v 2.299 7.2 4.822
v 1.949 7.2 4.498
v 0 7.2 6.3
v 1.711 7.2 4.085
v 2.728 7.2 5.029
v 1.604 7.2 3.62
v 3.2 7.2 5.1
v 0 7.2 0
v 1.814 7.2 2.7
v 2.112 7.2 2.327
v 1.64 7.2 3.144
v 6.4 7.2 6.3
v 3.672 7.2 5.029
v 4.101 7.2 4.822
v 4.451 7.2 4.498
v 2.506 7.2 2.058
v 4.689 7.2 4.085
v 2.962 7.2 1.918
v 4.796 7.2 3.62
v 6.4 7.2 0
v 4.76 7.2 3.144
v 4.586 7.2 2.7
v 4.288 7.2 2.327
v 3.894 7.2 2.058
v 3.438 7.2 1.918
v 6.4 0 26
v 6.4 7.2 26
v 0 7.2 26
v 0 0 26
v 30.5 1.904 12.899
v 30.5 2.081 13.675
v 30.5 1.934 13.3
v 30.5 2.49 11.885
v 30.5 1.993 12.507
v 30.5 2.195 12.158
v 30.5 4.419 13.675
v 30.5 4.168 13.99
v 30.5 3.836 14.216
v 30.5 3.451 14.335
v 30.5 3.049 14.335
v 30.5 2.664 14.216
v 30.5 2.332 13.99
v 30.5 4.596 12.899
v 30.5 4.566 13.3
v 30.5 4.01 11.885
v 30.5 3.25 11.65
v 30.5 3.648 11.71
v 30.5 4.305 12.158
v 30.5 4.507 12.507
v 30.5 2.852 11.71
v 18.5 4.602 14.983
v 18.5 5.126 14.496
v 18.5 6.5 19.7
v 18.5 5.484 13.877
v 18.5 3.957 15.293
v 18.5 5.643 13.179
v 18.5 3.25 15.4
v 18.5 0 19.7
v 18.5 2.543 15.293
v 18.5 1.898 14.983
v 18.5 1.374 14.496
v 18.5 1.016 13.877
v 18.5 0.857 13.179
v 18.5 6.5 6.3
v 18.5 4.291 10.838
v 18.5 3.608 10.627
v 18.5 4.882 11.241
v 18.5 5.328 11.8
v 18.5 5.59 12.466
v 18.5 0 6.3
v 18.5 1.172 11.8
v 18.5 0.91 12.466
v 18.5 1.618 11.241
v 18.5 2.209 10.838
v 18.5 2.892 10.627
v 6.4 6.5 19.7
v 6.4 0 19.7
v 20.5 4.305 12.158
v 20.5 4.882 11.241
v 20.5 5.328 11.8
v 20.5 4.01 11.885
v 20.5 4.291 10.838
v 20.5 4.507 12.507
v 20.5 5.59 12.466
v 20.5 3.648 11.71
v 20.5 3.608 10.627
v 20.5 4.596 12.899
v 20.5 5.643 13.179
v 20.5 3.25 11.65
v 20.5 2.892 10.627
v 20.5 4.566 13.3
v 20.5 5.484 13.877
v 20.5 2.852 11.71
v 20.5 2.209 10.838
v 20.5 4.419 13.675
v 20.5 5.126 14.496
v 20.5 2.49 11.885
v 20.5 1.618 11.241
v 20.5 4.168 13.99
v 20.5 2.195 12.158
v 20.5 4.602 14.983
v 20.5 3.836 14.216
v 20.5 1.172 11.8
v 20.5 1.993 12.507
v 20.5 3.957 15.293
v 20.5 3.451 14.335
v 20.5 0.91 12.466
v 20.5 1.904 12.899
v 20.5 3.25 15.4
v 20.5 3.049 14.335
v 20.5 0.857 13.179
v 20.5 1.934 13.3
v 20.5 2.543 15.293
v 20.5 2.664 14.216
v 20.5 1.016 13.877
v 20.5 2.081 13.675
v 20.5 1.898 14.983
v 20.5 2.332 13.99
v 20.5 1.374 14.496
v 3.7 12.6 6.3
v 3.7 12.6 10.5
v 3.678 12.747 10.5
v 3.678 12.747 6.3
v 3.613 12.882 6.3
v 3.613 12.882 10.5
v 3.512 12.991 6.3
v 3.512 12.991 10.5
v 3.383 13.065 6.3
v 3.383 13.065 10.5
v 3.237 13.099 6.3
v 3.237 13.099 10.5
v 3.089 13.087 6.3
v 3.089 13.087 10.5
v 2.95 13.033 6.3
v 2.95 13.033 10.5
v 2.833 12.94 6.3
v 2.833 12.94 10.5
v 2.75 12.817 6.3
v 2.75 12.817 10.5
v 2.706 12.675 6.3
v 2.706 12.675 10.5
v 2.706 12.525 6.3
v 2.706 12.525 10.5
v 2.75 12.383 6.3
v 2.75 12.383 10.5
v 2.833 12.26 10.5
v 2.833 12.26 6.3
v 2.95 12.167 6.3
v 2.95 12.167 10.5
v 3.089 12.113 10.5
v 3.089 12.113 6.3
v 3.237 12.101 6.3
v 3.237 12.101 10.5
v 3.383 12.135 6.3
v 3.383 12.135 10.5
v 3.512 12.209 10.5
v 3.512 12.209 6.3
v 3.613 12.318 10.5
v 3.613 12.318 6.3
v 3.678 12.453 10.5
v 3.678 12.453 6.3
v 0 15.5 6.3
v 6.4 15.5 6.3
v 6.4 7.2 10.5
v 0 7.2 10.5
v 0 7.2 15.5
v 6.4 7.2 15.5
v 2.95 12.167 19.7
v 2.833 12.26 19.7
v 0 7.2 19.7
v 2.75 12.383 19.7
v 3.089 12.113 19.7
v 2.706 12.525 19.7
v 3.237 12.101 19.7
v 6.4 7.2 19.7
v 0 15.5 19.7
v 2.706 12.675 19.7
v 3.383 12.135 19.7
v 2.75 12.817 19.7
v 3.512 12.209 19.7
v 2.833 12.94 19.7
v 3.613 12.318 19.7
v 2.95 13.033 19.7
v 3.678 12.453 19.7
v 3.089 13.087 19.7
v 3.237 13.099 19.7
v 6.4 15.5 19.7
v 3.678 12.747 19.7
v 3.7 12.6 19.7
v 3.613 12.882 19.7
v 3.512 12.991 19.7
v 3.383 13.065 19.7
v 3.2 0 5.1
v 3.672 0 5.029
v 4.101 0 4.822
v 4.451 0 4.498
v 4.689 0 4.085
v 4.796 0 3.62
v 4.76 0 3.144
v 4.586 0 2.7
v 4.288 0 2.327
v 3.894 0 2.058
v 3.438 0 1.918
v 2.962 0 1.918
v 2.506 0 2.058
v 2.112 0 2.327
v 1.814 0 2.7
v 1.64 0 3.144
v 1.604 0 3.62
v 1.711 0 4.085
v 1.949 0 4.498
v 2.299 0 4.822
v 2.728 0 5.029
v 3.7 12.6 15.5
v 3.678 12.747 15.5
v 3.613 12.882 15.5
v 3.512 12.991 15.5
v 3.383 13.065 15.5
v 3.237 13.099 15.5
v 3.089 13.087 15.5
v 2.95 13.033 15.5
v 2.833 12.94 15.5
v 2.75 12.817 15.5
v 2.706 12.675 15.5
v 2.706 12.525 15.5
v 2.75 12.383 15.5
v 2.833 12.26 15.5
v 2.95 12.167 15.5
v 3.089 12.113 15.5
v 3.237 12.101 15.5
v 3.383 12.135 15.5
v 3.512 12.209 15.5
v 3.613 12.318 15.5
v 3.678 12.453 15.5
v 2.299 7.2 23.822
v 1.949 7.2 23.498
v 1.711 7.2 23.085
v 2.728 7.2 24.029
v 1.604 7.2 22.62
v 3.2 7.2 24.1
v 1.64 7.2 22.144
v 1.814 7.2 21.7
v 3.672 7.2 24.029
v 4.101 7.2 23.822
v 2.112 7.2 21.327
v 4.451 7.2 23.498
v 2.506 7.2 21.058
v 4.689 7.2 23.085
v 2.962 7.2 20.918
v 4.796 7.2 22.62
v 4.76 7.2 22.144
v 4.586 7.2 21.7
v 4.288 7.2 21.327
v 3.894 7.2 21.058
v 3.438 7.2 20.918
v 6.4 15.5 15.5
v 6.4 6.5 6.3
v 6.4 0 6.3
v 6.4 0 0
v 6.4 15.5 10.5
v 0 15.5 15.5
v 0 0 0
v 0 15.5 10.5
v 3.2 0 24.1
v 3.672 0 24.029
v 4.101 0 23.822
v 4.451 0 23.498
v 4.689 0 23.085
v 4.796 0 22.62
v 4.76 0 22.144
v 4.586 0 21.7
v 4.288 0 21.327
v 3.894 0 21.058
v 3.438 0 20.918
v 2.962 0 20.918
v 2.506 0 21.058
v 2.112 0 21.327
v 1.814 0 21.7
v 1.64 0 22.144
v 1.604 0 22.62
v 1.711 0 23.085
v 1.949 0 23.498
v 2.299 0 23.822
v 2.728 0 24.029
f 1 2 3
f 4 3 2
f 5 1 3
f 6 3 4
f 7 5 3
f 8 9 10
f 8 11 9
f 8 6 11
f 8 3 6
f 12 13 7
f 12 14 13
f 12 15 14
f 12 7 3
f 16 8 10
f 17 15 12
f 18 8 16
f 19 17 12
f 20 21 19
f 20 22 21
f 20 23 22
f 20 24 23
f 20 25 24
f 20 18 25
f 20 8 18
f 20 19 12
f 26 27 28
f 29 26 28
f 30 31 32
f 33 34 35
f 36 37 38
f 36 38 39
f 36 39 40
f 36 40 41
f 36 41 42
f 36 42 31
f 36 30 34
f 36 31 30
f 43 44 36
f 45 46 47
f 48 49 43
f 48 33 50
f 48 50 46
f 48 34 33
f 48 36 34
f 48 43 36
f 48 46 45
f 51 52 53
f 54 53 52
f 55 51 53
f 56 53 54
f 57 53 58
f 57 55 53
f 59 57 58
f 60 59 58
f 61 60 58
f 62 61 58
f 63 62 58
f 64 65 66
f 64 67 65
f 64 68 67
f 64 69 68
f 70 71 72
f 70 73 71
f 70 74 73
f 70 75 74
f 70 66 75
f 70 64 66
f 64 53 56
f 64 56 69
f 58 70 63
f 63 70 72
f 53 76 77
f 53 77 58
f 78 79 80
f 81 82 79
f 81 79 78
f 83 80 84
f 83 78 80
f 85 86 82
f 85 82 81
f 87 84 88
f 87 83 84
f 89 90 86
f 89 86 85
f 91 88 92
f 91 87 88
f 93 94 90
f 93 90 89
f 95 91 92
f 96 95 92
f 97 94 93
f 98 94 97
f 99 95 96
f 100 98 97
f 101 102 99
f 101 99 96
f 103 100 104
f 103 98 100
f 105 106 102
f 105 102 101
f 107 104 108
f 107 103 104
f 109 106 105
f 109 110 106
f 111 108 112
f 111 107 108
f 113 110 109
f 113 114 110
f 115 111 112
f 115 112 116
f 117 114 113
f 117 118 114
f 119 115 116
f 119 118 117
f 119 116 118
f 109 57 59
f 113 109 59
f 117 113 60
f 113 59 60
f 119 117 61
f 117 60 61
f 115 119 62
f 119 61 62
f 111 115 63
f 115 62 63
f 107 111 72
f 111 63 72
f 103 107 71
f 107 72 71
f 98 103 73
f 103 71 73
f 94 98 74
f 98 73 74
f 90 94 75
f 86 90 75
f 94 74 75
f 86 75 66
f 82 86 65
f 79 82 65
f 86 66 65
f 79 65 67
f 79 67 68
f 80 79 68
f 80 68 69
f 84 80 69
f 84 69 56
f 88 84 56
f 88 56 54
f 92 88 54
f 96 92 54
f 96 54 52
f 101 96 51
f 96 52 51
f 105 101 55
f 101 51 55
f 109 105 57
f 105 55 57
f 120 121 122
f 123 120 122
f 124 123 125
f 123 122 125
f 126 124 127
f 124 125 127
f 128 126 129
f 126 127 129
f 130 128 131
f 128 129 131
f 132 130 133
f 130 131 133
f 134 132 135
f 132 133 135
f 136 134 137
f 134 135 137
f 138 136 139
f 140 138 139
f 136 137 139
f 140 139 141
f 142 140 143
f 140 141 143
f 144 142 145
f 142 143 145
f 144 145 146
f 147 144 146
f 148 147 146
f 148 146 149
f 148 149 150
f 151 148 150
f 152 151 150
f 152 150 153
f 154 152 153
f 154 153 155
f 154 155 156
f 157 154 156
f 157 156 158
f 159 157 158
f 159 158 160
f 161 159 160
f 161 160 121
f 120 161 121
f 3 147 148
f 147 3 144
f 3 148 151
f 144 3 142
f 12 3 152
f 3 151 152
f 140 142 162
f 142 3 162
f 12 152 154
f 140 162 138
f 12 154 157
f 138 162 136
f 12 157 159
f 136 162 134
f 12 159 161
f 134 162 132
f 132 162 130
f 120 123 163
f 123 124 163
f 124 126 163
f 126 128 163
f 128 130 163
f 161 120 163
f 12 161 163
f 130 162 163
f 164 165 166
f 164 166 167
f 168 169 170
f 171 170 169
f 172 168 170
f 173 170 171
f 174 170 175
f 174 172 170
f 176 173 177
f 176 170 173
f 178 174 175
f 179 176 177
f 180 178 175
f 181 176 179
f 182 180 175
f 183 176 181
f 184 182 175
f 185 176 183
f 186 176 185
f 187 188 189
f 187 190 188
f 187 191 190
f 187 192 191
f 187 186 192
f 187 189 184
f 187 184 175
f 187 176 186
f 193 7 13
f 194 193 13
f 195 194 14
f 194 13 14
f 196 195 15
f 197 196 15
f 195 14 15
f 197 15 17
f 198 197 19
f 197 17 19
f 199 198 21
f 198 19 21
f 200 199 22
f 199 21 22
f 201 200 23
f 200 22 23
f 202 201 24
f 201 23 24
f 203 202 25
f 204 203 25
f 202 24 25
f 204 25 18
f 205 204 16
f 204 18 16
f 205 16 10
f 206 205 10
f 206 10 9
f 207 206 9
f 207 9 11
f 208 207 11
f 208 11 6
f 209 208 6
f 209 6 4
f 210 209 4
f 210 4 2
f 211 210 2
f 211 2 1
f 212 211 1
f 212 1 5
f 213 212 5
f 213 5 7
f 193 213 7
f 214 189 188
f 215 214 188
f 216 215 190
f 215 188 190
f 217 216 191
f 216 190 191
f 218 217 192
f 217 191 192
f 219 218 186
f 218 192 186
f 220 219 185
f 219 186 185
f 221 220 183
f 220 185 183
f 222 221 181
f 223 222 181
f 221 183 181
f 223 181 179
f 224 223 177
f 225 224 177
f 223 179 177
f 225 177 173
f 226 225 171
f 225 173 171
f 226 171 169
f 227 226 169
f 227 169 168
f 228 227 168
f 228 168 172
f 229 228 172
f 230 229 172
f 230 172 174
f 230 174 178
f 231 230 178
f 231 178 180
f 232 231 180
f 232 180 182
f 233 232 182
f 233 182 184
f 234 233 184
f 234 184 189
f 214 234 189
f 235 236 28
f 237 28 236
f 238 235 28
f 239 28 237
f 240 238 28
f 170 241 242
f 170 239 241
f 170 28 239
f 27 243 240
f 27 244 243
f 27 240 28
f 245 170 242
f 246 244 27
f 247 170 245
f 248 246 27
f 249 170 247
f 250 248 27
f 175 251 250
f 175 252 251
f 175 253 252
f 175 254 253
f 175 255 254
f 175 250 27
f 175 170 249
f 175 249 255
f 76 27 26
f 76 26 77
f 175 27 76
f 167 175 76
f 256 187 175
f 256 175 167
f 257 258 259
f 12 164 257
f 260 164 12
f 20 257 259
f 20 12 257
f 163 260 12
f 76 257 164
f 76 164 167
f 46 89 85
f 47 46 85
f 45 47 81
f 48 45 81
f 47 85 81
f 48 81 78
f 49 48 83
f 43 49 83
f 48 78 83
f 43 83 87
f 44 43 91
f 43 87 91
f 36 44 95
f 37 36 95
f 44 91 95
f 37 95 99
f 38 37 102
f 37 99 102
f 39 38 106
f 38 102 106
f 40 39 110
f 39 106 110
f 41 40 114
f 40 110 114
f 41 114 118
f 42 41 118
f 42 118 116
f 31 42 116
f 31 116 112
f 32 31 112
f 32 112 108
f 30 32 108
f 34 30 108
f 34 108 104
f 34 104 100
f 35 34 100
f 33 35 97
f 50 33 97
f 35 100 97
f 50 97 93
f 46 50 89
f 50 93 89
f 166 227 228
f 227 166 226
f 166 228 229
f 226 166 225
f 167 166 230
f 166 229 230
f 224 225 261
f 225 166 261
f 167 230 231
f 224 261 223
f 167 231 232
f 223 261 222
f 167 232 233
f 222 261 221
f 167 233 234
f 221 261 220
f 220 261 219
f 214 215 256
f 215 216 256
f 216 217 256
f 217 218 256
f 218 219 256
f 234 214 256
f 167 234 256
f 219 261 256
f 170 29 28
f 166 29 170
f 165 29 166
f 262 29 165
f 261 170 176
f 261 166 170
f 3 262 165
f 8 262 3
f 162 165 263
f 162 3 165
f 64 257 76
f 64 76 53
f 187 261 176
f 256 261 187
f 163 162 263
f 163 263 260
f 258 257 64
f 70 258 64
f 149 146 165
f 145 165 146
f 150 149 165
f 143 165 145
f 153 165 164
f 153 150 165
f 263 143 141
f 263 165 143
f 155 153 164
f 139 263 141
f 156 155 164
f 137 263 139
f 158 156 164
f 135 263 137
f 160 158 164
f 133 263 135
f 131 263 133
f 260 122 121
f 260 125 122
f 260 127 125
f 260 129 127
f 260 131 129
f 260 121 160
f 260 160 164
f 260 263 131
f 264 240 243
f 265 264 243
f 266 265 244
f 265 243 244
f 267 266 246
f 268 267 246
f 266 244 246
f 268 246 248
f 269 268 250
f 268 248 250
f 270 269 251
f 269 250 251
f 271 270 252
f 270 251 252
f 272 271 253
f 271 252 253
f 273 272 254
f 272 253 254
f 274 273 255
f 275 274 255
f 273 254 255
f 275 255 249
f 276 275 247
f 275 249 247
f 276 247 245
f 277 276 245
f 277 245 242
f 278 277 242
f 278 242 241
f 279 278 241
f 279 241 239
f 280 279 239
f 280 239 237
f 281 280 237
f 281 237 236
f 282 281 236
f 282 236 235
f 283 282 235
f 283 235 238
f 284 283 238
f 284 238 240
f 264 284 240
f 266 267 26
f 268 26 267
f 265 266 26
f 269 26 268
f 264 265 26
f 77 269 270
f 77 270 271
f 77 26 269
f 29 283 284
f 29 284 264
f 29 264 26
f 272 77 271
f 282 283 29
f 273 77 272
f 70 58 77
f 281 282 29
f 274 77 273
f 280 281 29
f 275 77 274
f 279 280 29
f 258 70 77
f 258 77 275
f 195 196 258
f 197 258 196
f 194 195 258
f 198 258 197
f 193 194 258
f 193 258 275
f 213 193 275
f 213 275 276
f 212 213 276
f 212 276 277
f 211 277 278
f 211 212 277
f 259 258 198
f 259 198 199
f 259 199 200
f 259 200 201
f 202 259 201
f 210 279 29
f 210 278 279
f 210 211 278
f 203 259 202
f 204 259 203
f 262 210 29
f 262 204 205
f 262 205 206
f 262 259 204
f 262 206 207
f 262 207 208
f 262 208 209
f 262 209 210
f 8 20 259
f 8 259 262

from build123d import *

# Parameters (mm, degrees)
AUFSATZ_LINEAR_AUSTRAGEN1_DEPTH = 26
SKIZZE2_W                       = 12.1
SKIZZE2_H                       = 6.3
SCHNITT_LINEAR_AUSTRAGEN1_DEPTH = 26
SKIZZE3_W                       = 6.4
SKIZZE3_H                       = 6.3
SCHNITT_LINEAR_AUSTRAGEN2_DEPTH = 8.3
SKIZZE4_W                       = 6.4
SKIZZE4_H                       = 5
SCHNITT_LINEAR_AUSTRAGEN3_DEPTH = 8.3
SKIZZE5_R                       = 0.5
SCHNITT_LINEAR_AUSTRAGEN4_DEPTH = 32.154293444
SKIZZE6_R                       = 1.6
SCHNITT_LINEAR_AUSTRAGEN5_DEPTH = 8.3
SKIZZE7_R                       = 2.4
AUFSATZ_LINEAR_AUSTRAGEN2_DEPTH = 2
SKIZZE8_R                       = 1.35
AUFSATZ_LINEAR_AUSTRAGEN3_DEPTH = 10


with BuildPart() as part:
    # Skizze1 → Aufsatz-Linear austragen1 (new body)
    with BuildSketch(Plane.XY):
        Polygon((0, 0), (0, 15.5), (6.4, 15.5), (6.4, 6.5), (18.5, 6.5), (18.5, 0), align=None)
    extrude(amount=AUFSATZ_LINEAR_AUSTRAGEN1_DEPTH)

    # Skizze2 → Schnitt-Linear austragen1 (cut)
    with BuildSketch(Plane(origin=(0, 6.5, 0), x_dir=(1, 0, 0), z_dir=(0, 1, 0))):
        with Locations((12.45, -22.85)):
            Rectangle(SKIZZE2_W, SKIZZE2_H)
        with Locations((12.45, -3.15)):
            Rectangle(SKIZZE2_W, SKIZZE2_H)
    extrude(amount=-SCHNITT_LINEAR_AUSTRAGEN1_DEPTH, mode=Mode.SUBTRACT)

    # Skizze3 → Schnitt-Linear austragen2 (cut)
    with BuildSketch(Plane(origin=(0, 15.5, 0), x_dir=(1, 0, 0), z_dir=(0, 1, 0))):
        with Locations((3.2, -22.85)):
            Rectangle(SKIZZE3_W, SKIZZE3_H)
        with Locations((3.2, -3.15)):
            Rectangle(SKIZZE3_W, SKIZZE3_H)
    extrude(amount=-SCHNITT_LINEAR_AUSTRAGEN2_DEPTH, mode=Mode.SUBTRACT)

    # Skizze4 → Schnitt-Linear austragen3 (cut)
    with BuildSketch(Plane(origin=(0, 15.5, 0), x_dir=(1, 0, 0), z_dir=(0, 1, 0))):
        with Locations((3.2, -13)):
            Rectangle(SKIZZE4_W, SKIZZE4_H)
    extrude(amount=-SCHNITT_LINEAR_AUSTRAGEN3_DEPTH, mode=Mode.SUBTRACT)

    # Skizze5 → Schnitt-Linear austragen4 (cut, through all)
    with BuildSketch(Plane.XY.offset(19.7)):
        with Locations((3.2, 12.6)):
            Circle(SKIZZE5_R)
    extrude(amount=-SCHNITT_LINEAR_AUSTRAGEN4_DEPTH, mode=Mode.SUBTRACT)

    # Skizze6 → Schnitt-Linear austragen5 (cut)
    with BuildSketch(Plane(origin=(0, 7.2, 0), x_dir=(1, 0, 0), z_dir=(0, 1, 0))):
        with Locations(Location((3.2, -22.5, 0), (0, 0, 270))):
            Circle(SKIZZE6_R)
        with Locations(Location((3.2, -3.5, 0), (0, 0, 270))):
            Circle(SKIZZE6_R)
    extrude(amount=-SCHNITT_LINEAR_AUSTRAGEN5_DEPTH, mode=Mode.SUBTRACT)

    # Skizze7 → Aufsatz-Linear austragen2 (add)
    with BuildSketch(Plane(origin=(18.5, 0, 0), x_dir=(0, 0, -1), z_dir=(1, 0, 0))):
        with Locations(Location((-13, 3.25, 0), (0, 0, 180))):
            Circle(SKIZZE7_R)
    extrude(amount=AUFSATZ_LINEAR_AUSTRAGEN2_DEPTH)

    # Skizze8 → Aufsatz-Linear austragen3 (add)
    with BuildSketch(Plane(origin=(20.5, 0, 0), x_dir=(0, 0, -1), z_dir=(1, 0, 0))):
        with Locations((-13, 3.25)):
            Circle(SKIZZE8_R)
    extrude(amount=AUFSATZ_LINEAR_AUSTRAGEN3_DEPTH)


solid = part.part
